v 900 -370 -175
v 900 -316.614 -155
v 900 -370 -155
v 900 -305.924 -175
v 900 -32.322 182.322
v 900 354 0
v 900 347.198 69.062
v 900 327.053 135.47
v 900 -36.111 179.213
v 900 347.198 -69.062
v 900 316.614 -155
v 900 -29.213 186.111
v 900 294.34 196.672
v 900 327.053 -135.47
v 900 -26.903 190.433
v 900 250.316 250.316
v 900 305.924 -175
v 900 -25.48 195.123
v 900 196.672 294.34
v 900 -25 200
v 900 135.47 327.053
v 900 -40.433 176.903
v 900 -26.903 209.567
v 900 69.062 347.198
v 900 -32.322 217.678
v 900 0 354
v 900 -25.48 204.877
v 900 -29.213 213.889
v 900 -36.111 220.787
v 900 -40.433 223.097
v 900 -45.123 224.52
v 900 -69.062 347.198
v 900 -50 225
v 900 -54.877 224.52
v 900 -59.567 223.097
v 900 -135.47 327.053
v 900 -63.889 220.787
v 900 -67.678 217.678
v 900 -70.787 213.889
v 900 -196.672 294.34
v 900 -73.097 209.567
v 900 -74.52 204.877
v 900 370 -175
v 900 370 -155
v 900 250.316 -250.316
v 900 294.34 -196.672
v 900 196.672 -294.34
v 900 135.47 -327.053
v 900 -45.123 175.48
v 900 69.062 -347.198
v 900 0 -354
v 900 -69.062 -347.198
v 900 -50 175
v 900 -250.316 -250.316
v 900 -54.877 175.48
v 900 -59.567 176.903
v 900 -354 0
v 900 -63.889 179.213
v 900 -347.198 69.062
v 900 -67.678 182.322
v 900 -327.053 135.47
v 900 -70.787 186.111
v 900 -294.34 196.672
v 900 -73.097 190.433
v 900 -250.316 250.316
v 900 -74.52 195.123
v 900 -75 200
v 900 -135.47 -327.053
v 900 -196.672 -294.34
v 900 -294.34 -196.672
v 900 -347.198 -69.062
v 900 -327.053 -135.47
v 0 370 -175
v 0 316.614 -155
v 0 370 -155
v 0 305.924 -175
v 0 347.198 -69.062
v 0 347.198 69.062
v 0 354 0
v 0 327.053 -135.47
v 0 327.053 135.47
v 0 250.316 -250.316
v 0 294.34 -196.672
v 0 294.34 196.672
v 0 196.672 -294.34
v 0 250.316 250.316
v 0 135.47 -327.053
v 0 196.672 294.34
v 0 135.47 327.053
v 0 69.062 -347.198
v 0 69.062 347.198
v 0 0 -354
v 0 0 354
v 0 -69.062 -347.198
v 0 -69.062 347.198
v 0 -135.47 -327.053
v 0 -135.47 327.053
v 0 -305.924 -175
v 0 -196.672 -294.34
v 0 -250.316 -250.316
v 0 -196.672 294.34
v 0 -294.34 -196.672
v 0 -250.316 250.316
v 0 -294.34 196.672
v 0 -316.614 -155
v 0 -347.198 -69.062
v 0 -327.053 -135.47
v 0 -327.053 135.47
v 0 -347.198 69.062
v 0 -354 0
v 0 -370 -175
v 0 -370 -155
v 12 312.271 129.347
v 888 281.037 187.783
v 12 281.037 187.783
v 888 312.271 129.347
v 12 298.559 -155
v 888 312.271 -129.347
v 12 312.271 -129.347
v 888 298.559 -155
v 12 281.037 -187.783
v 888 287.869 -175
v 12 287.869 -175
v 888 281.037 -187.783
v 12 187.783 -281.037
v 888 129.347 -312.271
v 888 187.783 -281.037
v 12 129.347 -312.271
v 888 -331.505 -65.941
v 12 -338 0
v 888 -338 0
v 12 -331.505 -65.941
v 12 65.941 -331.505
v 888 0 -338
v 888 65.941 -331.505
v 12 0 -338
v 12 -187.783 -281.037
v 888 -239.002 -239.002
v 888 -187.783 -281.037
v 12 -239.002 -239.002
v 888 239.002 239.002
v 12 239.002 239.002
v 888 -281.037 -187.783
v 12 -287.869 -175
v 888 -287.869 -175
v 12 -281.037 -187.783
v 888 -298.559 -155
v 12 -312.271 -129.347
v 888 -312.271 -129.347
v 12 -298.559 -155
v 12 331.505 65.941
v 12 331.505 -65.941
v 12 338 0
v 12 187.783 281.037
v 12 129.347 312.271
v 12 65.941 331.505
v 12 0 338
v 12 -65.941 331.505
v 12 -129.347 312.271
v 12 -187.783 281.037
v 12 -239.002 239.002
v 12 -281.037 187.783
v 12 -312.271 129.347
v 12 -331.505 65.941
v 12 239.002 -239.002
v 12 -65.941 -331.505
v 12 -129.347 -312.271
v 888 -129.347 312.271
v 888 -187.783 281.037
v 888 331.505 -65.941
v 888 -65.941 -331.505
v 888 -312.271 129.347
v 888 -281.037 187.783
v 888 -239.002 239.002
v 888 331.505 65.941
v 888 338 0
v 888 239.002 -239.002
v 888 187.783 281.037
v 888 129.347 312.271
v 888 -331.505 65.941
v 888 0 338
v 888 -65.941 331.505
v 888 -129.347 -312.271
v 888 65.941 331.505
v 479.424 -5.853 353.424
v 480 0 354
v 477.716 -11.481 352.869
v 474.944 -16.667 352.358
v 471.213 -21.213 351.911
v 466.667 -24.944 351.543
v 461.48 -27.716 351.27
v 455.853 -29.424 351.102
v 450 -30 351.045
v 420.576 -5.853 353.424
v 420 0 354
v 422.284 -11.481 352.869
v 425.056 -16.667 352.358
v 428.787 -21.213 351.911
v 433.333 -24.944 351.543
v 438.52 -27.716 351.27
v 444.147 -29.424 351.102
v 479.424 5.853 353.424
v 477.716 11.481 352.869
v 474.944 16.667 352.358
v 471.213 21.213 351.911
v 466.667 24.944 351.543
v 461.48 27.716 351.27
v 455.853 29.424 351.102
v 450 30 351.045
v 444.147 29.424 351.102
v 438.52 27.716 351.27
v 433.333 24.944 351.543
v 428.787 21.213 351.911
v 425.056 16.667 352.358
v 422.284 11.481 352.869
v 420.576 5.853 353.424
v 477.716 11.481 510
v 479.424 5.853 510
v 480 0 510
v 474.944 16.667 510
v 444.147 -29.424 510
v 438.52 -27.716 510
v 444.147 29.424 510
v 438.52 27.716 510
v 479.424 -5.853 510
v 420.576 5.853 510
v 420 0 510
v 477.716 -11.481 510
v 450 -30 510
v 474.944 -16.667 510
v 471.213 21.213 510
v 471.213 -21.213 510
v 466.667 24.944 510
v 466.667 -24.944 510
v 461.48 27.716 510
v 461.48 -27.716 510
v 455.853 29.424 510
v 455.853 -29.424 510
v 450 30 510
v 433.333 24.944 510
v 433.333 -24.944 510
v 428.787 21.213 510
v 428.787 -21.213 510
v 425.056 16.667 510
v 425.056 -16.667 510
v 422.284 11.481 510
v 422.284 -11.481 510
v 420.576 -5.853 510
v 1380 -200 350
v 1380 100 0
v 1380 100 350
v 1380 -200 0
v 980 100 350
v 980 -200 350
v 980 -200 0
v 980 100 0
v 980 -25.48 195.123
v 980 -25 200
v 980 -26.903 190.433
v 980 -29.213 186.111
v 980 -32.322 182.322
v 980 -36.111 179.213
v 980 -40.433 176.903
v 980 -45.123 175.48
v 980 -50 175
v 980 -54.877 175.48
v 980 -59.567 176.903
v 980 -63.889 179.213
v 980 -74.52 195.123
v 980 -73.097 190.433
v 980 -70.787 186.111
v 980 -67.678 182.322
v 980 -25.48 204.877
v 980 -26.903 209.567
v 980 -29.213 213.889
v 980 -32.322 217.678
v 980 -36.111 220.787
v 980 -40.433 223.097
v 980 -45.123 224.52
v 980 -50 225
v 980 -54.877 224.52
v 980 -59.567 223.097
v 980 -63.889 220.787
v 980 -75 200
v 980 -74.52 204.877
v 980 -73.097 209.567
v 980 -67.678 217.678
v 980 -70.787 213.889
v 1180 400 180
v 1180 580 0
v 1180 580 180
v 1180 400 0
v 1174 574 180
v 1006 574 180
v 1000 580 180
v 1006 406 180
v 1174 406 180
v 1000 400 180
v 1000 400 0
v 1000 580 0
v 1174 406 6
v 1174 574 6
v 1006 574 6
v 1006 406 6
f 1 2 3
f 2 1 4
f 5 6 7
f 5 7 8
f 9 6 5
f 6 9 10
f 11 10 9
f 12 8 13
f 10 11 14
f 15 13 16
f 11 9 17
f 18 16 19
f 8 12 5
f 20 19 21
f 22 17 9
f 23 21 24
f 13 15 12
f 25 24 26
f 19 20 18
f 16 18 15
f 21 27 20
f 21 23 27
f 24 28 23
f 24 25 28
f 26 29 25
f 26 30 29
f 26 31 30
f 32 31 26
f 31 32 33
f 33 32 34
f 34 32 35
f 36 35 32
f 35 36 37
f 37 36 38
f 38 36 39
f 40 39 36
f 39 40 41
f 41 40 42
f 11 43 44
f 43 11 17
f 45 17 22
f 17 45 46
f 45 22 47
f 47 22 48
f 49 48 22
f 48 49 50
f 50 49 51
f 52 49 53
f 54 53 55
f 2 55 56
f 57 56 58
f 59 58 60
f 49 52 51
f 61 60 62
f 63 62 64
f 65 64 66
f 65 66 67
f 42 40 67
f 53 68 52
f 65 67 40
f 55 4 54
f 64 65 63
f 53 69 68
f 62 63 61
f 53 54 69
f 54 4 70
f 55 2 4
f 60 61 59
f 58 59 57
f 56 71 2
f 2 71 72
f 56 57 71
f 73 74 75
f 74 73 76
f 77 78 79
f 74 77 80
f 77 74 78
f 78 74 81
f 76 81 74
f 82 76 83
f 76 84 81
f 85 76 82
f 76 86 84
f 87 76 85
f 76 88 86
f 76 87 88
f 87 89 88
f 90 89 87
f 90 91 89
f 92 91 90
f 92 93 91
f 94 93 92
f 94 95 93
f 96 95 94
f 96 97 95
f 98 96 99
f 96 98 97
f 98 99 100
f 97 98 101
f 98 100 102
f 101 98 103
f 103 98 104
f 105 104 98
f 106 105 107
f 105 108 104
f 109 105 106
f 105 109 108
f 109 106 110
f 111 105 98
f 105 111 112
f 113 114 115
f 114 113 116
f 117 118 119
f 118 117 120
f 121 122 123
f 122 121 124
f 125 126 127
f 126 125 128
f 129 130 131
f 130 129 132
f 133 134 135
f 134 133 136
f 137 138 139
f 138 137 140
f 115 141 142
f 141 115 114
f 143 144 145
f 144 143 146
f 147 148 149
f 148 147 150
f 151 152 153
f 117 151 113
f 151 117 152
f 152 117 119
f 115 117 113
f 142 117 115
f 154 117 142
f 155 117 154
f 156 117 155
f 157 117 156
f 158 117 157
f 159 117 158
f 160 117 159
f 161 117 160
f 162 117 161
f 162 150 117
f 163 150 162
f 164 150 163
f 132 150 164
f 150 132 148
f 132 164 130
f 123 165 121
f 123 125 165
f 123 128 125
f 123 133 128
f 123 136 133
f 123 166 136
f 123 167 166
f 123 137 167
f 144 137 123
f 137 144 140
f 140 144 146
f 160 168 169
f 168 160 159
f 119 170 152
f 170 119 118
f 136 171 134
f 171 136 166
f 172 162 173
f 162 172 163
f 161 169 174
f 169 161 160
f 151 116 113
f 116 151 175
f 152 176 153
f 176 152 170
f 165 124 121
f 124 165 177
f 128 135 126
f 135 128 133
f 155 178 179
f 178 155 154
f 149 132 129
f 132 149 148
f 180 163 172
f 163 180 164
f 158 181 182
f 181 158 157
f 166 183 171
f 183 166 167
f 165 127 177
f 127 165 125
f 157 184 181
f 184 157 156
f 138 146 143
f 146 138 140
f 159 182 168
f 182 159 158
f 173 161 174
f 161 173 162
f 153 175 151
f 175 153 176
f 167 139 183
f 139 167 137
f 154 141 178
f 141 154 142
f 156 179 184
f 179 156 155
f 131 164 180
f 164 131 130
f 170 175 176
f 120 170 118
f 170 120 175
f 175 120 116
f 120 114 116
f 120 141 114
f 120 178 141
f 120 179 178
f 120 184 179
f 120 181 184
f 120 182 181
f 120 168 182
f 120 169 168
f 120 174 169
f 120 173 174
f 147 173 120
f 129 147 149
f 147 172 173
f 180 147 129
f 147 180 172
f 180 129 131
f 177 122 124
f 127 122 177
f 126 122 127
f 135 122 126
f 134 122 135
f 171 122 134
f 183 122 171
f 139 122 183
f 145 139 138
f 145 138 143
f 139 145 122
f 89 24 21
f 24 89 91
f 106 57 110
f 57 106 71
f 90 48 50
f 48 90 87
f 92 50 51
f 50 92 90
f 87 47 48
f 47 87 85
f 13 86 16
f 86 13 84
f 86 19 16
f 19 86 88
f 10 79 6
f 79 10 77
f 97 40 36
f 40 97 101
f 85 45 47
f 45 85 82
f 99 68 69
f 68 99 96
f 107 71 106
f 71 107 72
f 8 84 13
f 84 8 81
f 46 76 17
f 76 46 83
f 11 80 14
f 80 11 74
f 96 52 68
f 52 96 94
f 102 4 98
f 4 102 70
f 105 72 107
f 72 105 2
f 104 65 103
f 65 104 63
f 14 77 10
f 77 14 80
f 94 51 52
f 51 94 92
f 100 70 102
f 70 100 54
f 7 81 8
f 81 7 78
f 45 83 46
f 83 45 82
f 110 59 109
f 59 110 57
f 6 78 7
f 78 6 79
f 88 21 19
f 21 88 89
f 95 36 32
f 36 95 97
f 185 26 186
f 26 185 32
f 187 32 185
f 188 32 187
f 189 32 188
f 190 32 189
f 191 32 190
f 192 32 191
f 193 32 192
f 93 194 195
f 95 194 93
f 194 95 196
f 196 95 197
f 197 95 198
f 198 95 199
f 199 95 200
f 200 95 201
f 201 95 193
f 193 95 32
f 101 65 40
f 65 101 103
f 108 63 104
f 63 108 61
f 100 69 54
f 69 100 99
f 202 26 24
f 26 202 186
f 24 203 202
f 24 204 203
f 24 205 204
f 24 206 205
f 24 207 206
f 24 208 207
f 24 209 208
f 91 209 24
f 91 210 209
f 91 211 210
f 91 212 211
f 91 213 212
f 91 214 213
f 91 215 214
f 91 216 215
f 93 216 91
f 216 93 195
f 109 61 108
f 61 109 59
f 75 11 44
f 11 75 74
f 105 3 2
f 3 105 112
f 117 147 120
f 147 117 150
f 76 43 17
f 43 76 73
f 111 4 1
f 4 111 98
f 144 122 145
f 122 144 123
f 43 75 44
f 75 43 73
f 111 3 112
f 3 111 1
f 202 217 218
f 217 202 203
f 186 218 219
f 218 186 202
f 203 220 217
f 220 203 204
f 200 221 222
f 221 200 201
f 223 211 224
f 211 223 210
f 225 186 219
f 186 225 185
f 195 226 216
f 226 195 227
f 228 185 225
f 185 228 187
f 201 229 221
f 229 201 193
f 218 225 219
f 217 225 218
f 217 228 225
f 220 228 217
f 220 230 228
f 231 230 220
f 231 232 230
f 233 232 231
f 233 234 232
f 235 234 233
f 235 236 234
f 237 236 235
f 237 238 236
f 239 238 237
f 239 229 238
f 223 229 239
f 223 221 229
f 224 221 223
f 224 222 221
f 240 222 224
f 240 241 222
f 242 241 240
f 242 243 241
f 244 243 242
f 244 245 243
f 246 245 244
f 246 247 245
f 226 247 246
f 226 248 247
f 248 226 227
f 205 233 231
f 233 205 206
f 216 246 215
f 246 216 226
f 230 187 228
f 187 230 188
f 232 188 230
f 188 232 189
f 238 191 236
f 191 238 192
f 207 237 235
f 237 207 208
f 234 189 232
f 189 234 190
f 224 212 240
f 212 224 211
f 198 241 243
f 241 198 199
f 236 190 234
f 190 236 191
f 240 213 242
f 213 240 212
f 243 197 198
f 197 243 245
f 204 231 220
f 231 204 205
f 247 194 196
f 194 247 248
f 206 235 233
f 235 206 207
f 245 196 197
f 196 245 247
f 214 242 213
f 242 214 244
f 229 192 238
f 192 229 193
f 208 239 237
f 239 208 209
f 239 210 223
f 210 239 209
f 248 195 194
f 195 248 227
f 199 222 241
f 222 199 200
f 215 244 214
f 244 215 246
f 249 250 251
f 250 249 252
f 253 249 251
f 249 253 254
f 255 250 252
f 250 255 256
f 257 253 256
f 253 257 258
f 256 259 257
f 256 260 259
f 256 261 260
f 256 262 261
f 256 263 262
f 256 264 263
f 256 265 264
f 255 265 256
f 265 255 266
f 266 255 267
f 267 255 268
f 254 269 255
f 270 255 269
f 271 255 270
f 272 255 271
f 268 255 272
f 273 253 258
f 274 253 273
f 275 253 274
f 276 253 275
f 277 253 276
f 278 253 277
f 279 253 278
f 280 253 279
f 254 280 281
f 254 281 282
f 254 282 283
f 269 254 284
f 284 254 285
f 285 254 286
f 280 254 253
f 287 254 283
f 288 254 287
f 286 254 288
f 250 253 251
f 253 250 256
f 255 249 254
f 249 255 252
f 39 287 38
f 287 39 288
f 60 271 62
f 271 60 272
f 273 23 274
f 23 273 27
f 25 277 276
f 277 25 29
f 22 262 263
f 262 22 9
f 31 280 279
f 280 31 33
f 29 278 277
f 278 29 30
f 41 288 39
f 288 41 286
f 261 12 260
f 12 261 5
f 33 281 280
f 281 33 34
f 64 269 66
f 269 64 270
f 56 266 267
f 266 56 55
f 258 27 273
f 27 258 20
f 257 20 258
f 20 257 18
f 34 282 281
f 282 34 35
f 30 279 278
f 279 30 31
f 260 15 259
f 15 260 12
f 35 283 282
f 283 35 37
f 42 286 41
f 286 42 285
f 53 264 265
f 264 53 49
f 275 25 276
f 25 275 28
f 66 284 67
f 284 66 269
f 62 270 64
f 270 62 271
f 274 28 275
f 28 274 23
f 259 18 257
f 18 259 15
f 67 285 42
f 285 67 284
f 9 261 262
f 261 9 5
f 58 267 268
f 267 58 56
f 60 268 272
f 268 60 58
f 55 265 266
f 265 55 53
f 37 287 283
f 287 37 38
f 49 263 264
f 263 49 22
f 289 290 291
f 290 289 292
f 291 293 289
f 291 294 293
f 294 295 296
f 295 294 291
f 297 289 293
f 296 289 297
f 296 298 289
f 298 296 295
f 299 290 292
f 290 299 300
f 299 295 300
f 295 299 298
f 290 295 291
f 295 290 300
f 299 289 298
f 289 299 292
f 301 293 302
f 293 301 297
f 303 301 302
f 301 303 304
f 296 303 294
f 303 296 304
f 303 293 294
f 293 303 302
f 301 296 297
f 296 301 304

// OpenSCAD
// file: ../params.scad
// Shared millimetre parameters. Keep in lockstep with freecad/params.py.
// Module scale: 150 kg/day wet train. Walls are CPVC sheet, not metal.

$fn = 36;

WALL        = 12;     // CPVC sheet thickness
FLOOR       = 16;     // floor plate (trough sits on this)

// LEACH CSTR 1 — inside liquor box
CSTR_L      = 2000;
CSTR_W      = 1200;
CSTR_H      = 1400;   // liquid + freeboard
FREEBOARD   = 200;

// CSTR 2 weir (same vessel, +X wall)
WEIR_W      = 450;
WEIR_CREST  = CSTR_H - FREEBOARD;   // from inner floor
WEIR_SLOT_H = 80;
WEIR_LIP    = 120;    // external spout projection

// CSTR 3 floor auger — injection-molded PVC / FG
AUGER_D     = 140;    // flight OD
AUGER_SHAFT = 40;
AUGER_PITCH = 110;
AUGER_TROUGH_W = 180;
AUGER_TROUGH_H = 110;
AUGER_OFFSET_Y = 280; // trough centreline from inner -Y wall
AUGER_INCLINE  = 28;  // deg, lifts out of liquor toward +X

// mixer / nozzles (lid)
MIXER_D     = 50;
GAS_D       = 80;     // acid-gas takeoff
DROP_X      = 80;     // inner-X of shred drop slot
DROP_L      = 400;
DROP_W      = 250;
DROP_COAM   = 80;     // raised coaming around the slot

// LEACHATE PUMP / coarse strainer — −X wall, opposite the weir
PUMP_D      = 80;     // DN80
PUMP_Z      = 450;    // centreline above inner floor (submerged)
PUMP_Y      = 900;    // centreline from inner −Y (away from auger)
STRAINER_L  = 180;
STRAINER_W  = 140;
STRAINER_H  = 160;

// mezzanine feed train
MEZZ_H      = 2200;   // platform top above tank outer floor
MEZZ_L      = 1600;   // platform length in −X
MEZZ_THK    = 12;
HOPPER_L    = 700;
HOPPER_W    = 600;
HOPPER_H    = 800;
SHRED_L     = 500;
SHRED_W     = 500;
SHRED_H     = 450;
CONV_W      = 240;
CONV_H      = 120;
CONV_PLATE  = 6;      // trough plate
CONV_FLANGE = 40;
CONV_SPRING_D = 50;
CONV_SPRING_H = 80;
CONV_BOLT   = 10;     // M10 clearance
CONV_LEN    = 1800;   // default standalone length; plant instance is computed
DUST_D      = 150;    // dust-hood outlet to DUST header
AUGER_LIFT_L = 700;

// dewater belts + split (Phase A 4–6)
FDEW_L      = 1800;
FDEW_W      = 450;
FDEW_H      = 80;
FDEW_RISE   = 120;    // solids end higher so liquor runs back to weir
SDEW_L      = 1400;
SDEW_W      = 220;
SDEW_H      = 80;
SPLIT_L     = 600;
SPLIT_W     = 500;
SPLIT_H     = 400;
STUB_L      = 400;
STUB_W      = 300;
STUB_H      = 250;

// EW funnel cell
EW_L        = 600;    // along aisle (overflow direction)
EW_W        = 420;    // anode-cathode depth
EW_H        = 650;    // rectangular body
EW_FUNNEL_H = 220;
EW_VALVE_D  = 50;
EW_VALVE_L  = 60;
EW_MEM_T    = 4;      // CEM
EW_SLOT     = 10;     // membrane cassette slot
EW_PITCH    = 750;    // aisle spacing, centre to centre
AISLE_X0    = 200;
AISLE_Y     = -(EW_W + 2*WALL) - 400;
AISLE_Z     = 400;
BUND_H      = 150;
BUND_PAD    = 250;
SUMP_L      = 400;
SUMP_W      = 400;
SUMP_H      = 300;
VDF_D       = 700;
VDF_L       = 900;
PAIL_W      = 180;
HDR_D       = 80;
HDR_Z       = 1400;
PYRO_D      = 320;
PYRO_L      = 2800;

// Campus envelopes — lockstep with freecad/params.py
FARM_X=12000; FARM_Y=8000; FARM_L=12000; FARM_W=8000; FARM_H=4500;
FAB_X=12000;  FAB_Y=-6000; FAB_L=8000;   FAB_W=6000;  FAB_H=4000;
HAB_X=-8000;  HAB_Y=8000;  HAB_L=8000;   HAB_W=6000;  HAB_H=3200;
CRYO_X=-6000; CRYO_Y=-4000; CRYO_L=4000; CRYO_W=3000; CRYO_H=3000;
MFG_X=2000;   MFG_Y=9000;  MFG_L=6000;   MFG_W=4000;  MFG_H=3500;

LIFE_Z_GREY=900; LIFE_Z_UPW=1100; LIFE_Z_ETCH=1300;
LIFE_Z_O2=2800; LIFE_Z_N2=3000; LIFE_Z_CO2=3200;
LIFE_D_GREY=50; LIFE_D_UPW=40; LIFE_D_ETCH=32;
LIFE_D_GAS=25; LIFE_D_CO2=40;
// main file
// HARVEST VDF + vacuum pump + cloth wrap. Shared drum for manual mode.
include <../params.scad>;
$fn = 32;

module mfg_harvest_vdf() {
    difference() {
        rotate([0, 90, 0]) cylinder(h=VDF_L, d=VDF_D);
        rotate([0, 90, 0]) translate([0, 0, 12])
            cylinder(h=VDF_L - 24, d=VDF_D - 24);
    }
    rotate([0, 90, 0])
        difference() {
            cylinder(h=VDF_L, d=VDF_D + 8);
            translate([0, 0, -1]) cylinder(h=VDF_L+2, d=VDF_D);
        }
    translate([0, -VDF_D/2 - 20, -VDF_D/4])
        cube([VDF_L, VDF_D + 40, 20]);
    translate([VDF_L/2, 0, VDF_D/2]) cylinder(h=160, d=60);
    translate([VDF_L + 80, -200, 0]) cube([400, 300, 350]);
    translate([VDF_L + 80, -50, 200]) rotate([0, -90, 0]) cylinder(h=80, d=50);
}

module mfg_pail() {
    difference() {
        cube([PAIL_W, PAIL_W, PAIL_W]);
        translate([6, 6, 6]) cube([PAIL_W-12, PAIL_W-12, PAIL_W]);
    }
}

mfg_harvest_vdf();
translate([VDF_L + 100, 400, 0]) mfg_pail();
